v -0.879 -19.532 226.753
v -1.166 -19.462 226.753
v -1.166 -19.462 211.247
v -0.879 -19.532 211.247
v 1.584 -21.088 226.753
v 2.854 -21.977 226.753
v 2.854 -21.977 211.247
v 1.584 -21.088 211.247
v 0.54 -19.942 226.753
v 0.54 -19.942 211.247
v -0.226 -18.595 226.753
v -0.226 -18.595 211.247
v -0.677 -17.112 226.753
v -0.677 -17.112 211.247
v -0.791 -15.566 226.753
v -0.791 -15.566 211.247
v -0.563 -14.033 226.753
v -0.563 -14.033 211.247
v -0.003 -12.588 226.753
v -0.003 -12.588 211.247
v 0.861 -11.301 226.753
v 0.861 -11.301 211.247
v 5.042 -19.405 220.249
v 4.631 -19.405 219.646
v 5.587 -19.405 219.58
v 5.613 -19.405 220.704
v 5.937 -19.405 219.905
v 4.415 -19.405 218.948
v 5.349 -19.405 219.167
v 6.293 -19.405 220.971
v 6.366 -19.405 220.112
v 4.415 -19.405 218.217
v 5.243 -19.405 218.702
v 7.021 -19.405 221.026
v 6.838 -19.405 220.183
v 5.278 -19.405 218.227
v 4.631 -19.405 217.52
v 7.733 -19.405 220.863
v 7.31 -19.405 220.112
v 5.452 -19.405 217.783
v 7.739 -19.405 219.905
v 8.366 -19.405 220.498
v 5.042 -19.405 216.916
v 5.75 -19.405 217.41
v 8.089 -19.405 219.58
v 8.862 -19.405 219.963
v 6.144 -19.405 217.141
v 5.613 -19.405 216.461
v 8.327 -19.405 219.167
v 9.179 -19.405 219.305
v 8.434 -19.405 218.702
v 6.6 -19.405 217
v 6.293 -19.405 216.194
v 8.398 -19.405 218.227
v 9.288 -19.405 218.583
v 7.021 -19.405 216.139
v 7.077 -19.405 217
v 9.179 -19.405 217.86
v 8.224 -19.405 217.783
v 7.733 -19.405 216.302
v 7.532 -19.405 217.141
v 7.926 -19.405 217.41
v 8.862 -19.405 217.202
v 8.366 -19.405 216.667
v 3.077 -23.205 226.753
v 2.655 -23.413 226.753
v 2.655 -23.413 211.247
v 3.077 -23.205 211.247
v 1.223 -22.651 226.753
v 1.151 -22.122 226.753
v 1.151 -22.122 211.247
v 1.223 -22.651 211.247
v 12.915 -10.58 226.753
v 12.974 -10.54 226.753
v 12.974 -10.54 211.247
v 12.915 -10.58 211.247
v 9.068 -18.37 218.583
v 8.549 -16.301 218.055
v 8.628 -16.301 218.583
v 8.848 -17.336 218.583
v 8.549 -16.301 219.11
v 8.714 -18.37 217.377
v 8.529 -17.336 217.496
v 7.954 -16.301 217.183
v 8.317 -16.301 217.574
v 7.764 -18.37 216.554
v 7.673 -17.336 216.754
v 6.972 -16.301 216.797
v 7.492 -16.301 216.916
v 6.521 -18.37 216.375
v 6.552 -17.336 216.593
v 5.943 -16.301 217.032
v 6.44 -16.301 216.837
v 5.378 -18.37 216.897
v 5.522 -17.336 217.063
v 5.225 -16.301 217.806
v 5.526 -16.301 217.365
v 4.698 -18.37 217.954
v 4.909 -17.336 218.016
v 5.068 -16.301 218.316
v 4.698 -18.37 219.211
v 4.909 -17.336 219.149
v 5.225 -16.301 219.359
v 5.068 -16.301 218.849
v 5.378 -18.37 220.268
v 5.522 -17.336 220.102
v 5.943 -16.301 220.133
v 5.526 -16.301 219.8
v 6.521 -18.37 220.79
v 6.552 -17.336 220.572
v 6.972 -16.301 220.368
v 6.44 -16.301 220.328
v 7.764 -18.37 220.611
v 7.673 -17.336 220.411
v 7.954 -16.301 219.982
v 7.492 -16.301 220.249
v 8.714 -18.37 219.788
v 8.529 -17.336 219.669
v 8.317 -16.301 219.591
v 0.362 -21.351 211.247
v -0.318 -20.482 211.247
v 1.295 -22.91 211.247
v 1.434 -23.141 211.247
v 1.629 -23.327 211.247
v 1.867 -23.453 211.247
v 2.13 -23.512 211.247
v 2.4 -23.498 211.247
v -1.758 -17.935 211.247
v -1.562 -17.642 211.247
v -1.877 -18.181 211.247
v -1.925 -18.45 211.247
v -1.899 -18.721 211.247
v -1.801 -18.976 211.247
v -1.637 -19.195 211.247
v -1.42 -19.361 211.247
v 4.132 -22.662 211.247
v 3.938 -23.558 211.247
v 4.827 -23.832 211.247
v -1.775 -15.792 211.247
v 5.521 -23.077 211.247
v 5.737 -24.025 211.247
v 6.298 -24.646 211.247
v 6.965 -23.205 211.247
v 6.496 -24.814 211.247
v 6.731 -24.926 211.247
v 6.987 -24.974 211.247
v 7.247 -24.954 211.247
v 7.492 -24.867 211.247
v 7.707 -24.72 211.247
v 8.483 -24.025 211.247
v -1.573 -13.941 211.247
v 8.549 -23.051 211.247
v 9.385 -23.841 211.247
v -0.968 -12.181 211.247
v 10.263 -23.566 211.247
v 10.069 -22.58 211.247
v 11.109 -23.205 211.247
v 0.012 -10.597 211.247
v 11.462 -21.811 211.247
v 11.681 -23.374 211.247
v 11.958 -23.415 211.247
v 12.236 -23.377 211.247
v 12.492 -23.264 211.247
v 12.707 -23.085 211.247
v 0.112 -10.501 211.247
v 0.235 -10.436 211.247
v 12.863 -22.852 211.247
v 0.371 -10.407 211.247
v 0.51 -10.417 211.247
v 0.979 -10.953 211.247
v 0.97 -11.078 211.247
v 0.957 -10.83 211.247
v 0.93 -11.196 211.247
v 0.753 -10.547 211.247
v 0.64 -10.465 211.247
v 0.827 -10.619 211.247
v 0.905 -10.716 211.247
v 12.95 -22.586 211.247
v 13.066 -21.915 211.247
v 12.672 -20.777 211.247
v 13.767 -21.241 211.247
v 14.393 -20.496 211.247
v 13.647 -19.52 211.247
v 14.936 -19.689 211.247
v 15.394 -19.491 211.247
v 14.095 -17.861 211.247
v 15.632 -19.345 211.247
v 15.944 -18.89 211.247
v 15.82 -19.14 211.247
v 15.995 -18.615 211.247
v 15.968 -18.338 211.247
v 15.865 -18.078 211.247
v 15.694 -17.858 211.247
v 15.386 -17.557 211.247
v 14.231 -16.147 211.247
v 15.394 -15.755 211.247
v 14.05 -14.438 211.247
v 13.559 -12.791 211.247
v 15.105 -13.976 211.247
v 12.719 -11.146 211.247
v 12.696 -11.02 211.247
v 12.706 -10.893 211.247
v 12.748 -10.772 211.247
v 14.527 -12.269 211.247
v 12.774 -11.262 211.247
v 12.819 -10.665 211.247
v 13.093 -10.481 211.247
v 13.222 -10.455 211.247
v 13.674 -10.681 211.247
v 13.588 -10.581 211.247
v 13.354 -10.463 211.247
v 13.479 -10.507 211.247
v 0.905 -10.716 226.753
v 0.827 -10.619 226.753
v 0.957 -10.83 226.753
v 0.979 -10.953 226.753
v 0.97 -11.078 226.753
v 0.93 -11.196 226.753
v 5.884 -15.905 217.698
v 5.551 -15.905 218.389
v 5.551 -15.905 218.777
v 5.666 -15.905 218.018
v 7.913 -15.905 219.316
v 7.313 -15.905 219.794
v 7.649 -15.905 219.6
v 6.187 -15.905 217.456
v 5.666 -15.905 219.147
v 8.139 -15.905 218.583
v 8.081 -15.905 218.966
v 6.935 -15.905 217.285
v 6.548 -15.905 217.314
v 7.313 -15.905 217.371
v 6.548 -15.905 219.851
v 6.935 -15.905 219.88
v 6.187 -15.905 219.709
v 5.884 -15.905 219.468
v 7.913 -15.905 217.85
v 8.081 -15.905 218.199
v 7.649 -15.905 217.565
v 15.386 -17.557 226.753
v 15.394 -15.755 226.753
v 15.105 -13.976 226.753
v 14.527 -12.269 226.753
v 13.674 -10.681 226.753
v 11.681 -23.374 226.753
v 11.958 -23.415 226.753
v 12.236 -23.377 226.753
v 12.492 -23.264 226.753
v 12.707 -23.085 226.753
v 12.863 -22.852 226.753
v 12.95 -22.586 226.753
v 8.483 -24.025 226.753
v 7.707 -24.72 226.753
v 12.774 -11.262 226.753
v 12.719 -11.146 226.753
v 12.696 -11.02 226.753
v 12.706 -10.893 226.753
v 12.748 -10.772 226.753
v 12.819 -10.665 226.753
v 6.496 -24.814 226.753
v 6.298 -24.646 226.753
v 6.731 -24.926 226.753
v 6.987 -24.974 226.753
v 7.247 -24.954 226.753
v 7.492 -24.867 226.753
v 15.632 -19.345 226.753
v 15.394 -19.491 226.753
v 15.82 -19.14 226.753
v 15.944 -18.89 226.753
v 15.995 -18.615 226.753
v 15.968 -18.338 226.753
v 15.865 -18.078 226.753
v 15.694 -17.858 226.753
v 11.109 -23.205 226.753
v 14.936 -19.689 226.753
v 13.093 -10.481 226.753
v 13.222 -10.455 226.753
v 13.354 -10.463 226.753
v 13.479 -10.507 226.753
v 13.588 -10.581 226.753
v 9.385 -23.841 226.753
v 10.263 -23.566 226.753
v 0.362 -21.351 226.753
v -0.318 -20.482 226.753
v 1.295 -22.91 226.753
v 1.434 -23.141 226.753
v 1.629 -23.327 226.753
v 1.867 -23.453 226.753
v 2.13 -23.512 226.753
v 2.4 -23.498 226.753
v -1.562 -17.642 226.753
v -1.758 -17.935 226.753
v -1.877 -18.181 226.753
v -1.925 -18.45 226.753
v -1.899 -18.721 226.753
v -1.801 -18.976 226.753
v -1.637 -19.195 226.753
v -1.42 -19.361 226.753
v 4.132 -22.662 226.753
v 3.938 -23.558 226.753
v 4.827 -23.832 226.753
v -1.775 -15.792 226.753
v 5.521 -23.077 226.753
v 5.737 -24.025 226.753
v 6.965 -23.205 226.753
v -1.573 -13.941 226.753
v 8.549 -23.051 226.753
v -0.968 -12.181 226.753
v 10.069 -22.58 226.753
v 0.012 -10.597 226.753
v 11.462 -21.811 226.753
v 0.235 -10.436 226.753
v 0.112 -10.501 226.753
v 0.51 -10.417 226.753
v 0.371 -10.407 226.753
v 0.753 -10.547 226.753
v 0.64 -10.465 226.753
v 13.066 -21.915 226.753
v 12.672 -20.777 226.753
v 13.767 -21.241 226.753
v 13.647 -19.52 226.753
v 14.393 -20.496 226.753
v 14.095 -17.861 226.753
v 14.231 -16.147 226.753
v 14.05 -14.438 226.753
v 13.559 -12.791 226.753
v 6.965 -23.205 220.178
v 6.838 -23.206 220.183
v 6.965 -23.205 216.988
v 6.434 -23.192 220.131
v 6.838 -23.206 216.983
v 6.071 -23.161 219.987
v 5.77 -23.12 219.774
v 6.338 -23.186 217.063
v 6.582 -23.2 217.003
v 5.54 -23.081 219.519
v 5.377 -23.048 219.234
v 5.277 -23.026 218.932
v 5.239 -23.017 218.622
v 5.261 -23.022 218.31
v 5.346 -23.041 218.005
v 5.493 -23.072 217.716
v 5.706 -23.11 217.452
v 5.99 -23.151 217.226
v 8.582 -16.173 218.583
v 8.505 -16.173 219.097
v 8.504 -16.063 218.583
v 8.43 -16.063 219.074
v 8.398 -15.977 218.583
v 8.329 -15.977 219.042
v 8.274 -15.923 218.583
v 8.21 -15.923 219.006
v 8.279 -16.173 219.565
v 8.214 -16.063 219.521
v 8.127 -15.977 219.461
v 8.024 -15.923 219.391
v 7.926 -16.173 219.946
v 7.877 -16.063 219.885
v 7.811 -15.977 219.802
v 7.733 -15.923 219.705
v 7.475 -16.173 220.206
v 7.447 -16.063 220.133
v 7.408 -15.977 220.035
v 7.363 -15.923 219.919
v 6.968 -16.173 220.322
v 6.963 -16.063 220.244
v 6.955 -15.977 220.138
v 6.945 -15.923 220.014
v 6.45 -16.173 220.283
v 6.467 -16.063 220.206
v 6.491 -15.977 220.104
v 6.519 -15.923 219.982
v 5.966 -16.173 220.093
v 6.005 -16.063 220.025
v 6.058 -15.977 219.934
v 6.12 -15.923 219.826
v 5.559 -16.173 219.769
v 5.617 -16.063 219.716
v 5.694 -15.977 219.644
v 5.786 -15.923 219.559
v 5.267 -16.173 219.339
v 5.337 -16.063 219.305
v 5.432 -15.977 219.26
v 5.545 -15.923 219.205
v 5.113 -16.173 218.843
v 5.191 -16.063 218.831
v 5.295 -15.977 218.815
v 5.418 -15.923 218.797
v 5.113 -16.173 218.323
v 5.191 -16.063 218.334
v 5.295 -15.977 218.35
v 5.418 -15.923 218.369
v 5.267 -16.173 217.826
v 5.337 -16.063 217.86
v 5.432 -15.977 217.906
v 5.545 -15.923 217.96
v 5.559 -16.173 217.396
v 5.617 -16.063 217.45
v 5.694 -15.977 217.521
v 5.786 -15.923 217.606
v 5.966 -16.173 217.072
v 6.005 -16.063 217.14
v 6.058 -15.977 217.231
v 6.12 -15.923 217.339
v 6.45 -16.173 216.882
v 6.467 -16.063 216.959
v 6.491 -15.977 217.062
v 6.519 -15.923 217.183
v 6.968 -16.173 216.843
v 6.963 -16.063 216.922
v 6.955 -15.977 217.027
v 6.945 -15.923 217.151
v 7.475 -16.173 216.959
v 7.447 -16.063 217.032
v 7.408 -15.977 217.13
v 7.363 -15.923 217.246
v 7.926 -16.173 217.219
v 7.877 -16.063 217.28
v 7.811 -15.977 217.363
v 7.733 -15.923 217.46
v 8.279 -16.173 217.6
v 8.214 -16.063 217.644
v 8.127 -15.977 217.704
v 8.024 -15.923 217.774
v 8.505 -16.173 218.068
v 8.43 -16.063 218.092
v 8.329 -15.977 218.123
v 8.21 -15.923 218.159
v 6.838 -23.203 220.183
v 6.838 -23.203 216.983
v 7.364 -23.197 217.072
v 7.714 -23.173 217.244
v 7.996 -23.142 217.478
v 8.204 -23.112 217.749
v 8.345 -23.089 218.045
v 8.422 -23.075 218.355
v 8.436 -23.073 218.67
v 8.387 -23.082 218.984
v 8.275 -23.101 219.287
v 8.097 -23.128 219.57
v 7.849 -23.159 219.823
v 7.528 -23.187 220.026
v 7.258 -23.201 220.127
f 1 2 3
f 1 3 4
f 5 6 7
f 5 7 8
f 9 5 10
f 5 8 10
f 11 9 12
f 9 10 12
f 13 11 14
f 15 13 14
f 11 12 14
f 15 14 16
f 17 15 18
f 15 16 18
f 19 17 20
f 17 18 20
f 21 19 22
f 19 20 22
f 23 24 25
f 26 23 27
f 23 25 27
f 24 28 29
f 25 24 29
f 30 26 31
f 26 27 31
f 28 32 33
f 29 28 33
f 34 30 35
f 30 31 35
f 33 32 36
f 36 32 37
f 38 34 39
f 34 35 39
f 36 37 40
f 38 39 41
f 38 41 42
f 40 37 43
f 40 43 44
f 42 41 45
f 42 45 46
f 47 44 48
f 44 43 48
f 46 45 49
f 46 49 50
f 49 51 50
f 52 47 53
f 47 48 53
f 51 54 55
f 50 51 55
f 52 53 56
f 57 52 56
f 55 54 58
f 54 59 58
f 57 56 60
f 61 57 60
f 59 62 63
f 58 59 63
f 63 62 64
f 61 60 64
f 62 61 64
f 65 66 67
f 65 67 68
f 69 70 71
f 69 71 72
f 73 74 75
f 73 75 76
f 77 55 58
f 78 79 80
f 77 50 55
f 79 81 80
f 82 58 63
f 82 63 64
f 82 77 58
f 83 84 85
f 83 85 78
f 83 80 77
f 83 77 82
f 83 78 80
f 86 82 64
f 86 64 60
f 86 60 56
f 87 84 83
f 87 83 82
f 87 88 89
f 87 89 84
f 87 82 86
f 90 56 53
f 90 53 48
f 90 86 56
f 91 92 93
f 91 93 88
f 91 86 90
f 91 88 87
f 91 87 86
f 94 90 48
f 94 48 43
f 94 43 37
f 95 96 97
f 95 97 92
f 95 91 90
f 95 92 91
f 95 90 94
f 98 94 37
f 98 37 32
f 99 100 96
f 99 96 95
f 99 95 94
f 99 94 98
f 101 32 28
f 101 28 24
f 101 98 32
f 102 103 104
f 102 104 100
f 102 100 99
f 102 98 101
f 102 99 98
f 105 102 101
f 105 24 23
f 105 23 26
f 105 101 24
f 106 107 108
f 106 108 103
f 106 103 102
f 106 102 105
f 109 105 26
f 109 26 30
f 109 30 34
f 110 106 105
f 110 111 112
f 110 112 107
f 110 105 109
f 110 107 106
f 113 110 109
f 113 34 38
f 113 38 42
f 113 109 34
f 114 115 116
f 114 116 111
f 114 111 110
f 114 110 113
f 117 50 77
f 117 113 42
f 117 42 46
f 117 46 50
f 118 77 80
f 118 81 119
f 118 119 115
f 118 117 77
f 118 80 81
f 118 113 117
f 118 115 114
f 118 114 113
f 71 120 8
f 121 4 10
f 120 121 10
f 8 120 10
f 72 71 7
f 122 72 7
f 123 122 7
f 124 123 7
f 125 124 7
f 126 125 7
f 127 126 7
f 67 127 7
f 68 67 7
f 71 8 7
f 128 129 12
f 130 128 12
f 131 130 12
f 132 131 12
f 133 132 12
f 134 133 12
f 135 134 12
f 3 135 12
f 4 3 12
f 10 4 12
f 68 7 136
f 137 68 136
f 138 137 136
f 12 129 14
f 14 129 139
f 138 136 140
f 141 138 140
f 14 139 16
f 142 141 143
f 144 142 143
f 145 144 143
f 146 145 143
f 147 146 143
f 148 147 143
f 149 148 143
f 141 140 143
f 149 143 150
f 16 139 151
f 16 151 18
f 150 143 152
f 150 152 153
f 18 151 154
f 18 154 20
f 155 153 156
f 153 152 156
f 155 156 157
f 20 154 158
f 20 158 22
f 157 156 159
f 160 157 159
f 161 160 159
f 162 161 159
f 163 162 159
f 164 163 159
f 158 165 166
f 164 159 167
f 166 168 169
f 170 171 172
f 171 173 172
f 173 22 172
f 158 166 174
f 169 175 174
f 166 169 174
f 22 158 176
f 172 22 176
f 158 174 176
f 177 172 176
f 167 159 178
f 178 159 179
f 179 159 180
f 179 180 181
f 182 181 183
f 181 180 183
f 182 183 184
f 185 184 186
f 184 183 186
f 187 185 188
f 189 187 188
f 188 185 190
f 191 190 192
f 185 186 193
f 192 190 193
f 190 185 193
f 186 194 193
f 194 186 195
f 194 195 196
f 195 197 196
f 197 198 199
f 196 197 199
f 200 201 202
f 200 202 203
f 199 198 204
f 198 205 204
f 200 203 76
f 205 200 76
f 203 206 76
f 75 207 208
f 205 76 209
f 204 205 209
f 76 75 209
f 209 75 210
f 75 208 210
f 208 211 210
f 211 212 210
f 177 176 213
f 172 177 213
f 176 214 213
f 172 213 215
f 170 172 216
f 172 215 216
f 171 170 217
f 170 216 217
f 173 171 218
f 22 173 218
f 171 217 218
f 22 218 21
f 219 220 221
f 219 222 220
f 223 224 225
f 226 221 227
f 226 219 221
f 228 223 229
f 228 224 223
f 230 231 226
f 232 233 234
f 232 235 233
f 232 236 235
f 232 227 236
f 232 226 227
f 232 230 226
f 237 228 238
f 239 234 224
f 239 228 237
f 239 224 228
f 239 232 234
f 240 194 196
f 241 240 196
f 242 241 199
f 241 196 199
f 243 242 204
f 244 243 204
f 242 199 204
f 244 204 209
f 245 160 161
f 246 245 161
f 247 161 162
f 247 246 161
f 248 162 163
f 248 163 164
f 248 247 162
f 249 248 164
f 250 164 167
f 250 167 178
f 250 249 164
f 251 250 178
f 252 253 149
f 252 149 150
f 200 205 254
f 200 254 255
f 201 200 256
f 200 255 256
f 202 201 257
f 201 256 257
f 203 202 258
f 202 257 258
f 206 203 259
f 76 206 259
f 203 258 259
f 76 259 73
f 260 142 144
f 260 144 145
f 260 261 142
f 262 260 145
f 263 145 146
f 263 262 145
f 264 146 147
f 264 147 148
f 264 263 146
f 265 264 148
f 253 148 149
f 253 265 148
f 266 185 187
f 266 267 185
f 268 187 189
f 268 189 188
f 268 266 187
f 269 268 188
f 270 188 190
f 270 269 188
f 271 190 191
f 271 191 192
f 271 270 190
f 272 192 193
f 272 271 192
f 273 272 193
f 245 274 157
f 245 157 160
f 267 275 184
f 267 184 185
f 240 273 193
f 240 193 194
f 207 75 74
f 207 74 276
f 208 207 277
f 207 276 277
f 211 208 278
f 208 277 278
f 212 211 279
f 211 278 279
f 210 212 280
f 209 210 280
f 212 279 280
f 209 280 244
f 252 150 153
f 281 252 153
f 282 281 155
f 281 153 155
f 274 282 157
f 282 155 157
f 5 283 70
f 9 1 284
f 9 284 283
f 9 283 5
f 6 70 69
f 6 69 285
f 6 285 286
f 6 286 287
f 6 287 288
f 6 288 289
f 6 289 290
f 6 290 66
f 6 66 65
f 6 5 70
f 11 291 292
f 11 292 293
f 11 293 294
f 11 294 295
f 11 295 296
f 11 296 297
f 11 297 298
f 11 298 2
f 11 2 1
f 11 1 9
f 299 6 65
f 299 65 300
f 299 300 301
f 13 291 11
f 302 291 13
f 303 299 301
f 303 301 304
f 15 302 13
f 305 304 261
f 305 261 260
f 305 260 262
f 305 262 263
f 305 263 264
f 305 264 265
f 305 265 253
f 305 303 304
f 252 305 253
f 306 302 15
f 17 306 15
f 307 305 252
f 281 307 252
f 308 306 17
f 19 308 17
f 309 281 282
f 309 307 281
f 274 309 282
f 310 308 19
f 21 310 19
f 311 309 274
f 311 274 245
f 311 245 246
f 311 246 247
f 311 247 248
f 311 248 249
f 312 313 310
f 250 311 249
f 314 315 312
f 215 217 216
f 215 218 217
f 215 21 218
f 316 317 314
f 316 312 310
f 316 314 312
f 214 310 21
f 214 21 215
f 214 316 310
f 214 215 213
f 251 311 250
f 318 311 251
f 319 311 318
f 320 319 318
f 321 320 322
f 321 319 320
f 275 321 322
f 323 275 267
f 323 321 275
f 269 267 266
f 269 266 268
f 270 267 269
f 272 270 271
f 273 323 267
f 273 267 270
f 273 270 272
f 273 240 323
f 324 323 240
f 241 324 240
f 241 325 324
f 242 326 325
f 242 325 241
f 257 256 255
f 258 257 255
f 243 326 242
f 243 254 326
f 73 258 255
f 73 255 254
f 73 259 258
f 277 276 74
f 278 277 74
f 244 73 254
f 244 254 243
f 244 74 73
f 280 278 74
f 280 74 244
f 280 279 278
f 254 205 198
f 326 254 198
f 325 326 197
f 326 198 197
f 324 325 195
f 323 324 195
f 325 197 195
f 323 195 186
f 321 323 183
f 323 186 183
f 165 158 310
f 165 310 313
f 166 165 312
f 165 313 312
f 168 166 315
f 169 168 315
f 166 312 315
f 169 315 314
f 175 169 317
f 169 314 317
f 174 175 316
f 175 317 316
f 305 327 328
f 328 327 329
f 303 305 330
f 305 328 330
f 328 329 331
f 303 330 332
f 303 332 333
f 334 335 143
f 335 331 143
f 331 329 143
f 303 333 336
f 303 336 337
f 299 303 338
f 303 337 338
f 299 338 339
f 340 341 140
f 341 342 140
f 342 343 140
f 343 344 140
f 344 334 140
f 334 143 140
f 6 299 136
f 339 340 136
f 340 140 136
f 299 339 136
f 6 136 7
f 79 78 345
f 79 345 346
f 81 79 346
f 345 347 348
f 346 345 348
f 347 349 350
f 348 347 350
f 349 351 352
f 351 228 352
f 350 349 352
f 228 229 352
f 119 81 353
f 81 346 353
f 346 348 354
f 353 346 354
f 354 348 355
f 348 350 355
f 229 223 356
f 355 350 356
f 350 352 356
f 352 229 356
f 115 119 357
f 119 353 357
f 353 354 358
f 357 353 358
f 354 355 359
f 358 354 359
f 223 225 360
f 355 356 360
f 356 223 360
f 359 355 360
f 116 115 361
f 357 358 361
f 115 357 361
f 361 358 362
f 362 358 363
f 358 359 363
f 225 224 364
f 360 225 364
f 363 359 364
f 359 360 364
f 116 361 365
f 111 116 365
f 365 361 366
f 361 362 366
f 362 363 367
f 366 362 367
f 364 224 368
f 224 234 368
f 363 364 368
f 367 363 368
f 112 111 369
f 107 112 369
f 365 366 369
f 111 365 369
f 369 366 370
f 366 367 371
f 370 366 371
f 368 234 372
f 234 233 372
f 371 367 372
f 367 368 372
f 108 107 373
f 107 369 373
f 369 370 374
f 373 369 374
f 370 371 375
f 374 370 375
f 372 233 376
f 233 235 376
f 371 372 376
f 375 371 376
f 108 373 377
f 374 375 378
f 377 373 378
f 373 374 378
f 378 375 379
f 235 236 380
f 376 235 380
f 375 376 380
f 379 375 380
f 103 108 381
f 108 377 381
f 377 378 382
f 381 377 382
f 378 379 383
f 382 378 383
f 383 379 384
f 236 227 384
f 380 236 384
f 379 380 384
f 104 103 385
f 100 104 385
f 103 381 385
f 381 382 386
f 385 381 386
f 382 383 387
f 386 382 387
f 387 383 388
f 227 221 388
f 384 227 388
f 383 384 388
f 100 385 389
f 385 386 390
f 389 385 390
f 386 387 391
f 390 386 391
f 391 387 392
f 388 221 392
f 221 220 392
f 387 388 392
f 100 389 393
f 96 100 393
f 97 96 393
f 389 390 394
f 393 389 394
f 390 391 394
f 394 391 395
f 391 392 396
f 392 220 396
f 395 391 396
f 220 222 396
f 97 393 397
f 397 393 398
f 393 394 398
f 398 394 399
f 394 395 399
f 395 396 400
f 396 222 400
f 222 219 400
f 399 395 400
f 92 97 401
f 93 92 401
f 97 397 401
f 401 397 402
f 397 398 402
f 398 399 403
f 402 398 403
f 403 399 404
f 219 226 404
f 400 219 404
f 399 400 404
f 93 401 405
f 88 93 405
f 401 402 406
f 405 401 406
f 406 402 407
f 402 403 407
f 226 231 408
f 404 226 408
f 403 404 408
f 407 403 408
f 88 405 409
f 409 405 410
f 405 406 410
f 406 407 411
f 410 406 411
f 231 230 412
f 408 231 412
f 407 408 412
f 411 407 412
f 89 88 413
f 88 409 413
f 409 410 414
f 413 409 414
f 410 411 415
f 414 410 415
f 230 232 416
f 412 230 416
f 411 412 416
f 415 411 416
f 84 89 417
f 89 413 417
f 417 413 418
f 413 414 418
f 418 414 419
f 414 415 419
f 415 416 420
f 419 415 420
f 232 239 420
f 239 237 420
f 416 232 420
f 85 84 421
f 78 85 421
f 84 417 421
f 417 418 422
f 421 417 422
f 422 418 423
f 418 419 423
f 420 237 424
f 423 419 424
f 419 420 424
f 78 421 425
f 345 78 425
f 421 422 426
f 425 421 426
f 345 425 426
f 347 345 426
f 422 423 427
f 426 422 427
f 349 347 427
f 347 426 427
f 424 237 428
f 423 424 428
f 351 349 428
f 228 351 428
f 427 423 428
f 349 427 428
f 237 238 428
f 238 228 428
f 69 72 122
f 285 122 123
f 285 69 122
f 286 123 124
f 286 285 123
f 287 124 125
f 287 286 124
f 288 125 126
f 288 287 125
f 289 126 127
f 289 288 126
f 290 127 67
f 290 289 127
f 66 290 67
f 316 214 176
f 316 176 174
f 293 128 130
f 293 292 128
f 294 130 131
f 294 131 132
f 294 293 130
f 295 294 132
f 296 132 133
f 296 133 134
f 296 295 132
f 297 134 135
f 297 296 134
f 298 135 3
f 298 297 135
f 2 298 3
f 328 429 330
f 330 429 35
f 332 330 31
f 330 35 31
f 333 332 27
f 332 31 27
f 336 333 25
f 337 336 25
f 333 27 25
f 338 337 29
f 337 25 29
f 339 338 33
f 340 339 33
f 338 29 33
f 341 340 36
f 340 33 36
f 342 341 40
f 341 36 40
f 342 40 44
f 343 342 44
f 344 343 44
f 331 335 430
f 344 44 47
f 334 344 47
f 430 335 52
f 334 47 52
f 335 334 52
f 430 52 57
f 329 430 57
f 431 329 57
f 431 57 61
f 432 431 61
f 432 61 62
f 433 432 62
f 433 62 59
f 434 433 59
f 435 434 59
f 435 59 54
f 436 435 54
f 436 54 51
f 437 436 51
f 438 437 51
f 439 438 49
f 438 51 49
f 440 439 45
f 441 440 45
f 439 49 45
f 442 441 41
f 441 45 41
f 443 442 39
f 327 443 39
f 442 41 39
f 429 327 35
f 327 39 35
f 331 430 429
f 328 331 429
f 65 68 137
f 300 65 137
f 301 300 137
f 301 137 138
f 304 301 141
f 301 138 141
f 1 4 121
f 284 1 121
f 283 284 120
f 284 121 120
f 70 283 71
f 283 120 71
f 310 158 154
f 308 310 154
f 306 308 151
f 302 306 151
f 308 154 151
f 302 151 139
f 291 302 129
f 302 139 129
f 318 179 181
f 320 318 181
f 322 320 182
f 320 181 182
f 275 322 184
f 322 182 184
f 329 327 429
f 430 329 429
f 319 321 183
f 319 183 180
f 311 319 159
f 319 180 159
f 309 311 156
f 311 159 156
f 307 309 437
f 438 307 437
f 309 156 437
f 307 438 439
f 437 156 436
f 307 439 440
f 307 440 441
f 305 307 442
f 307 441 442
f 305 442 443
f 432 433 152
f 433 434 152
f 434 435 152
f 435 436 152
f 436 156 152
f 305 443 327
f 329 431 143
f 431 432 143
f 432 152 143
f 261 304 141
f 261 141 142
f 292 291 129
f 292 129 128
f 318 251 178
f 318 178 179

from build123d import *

# Parameters (mm, degrees)
BOSS_EXTRUDE2_DEPTH      = 438
SCALE2_SCALE             = 0.0354
FILLET1_R                = 1
FILLET3_R                = 0.5
BOSS_EXTRUDE4_REACH      = 229.494
BOSS_EXTRUDE4_END_RADIUS = 7.833804904
BOSS_EXTRUDE5_REACH      = 229.494
BOSS_EXTRUDE5_END_RADIUS = 7.195916772
SKETCH9_R                = 2.45
BOSS_EXTRUDE6_DEPTH      = 3.5
BOSS_EXTRUDE6_TAPER      = 12
FILLET4_R                = 0.5


with BuildPart() as part:
    # Sketch1 → Boss-Extrude2 (new body)
    with BuildSketch(Plane.XY):
        with BuildLine():
            Line((-163.578194132, 204.291420663), (-186.376739015, 226.341062883))
            ThreePointArc((-186.376739015, 226.341062883), (-239.375206738, 127.519864833), (-240.870528276, 15.393905402))
            Line((-240.870528276, 15.393905402), (-268.785604462, -26.370002184))
            Line((-268.785604462, -26.370002184), (-221.583341967, -38.017313709))
            ThreePointArc((-221.583341967, -38.017313709), (-196.547148618, -77.434601057), (-164.251041881, -111.161370973))
            Line((-164.251041881, -111.161370973), (-156.910200465, -164.920829998))
            Line((-156.910200465, -164.920829998), (-109.836943046, -141.764303292))
            ThreePointArc((-109.836943046, -141.764303292), (-73.054639313, -155.90344513), (-34.693982777, -164.920829998))
            Line((-34.693982777, -164.920829998), (0, -203.328769621))
            Line((0, -203.328769621), (42.8865283, -164.920829998))
            ThreePointArc((42.8865283, -164.920829998), (80.850316946, -156.155814803), (117.057486625, -141.764303292))
            Line((117.057486625, -141.764303292), (163.626630073, -155.521102036))
            Line((163.626630073, -155.521102036), (172.334894528, -105.315261233))
            ThreePointArc((172.334894528, -105.315261233), (201.269995869, -76.001800701), (225.162074479, -42.450531906))
            Line((225.162074479, -42.450531906), (276.709162079, -20.095520822))
            Line((276.709162079, -20.095520822), (237.860130884, 17.793666683))
            ThreePointArc((237.860130884, 17.793666683), (228.121311005, 125.922470041), (181.39622554, 223.91965937))
            Line((181.39622554, 223.91965937), (156.421805868, 206.970503899))
            ThreePointArc((156.421805868, 206.970503899), (202.986661671, 88.666279899), (188.748912803, -37.672398736))
            ThreePointArc((188.748912803, -37.672398736), (107.904666904, -114.25255983), (0, -141.764303292))
            ThreePointArc((0, -141.764303292), (-60.71851518, -133.27976481), (-116.145688788, -107.077591147))
            ThreePointArc((-116.145688788, -107.077591147), (-216.983443781, 36.858584217), (-163.578194132, 204.291420663))
        make_face()
    extrude(amount=BOSS_EXTRUDE2_DEPTH)


with BuildPart() as part_1:
    # Scale2: scaled about (7.22089485, -18.85403102, 219)
    add(part.part.scale(SCALE2_SCALE).moved(Location((6.965275172, -18.186598322, 211.2474))))

    # Fillet1
    fillet1_edges = [part_1.edges().sort_by_distance(p)[0] for p in [
        (16.76077951, -18.897979759, 219),
        (12.757657877, -23.692045334, 219),
        (6.965275172, -25.384436766, 219),
        (1.410654076, -24.024795704, 219),
        (-2.549735226, -19.120096399, 219),
    ]]
    fillet(fillet1_edges, radius=FILLET1_R)

    # Fillet3
    fillet3_edges = [part_1.edges().sort_by_distance(p)[0] for p in [
        (12.5026071, -10.859842484, 219),
        (13.386701556, -10.25984238, 219),
        (0.367538611, -10.174124696, 219),
        (1.1746071, -10.95468203, 219),
    ]]
    fillet(fillet3_edges, radius=FILLET3_R)

    # Boss-Extrude4: up to this cylinder (the profile starts inside it)
    boss_extrude4_end = Plane(origin=(7.002032477, -15.371335991, 218.5826), z_dir=(0, 0, -1)) * Cylinder(BOSS_EXTRUDE4_END_RADIUS, 475.655609807, mode=Mode.PRIVATE)
    # Sketch5 → Boss-Extrude4 (add, up to the surface)
    with BuildSketch(Plane(origin=(0, -19.405054659, 0), x_dir=(-1, 0, 0), z_dir=(0, -1, 0)), mode=Mode.PRIVATE) as boss_extrude4_sk1:
        with BuildLine():
            Line((-6.838033993, -220.1826), (-6.838033993, -216.9826))
            ThreePointArc((-6.838033993, -216.9826), (-8.438033993, -218.5826), (-6.838033993, -220.1826))
        make_face()
    boss_extrude4_tool1 = extrude(boss_extrude4_sk1.sketch, amount=BOSS_EXTRUDE4_REACH, mode=Mode.PRIVATE) & boss_extrude4_end
    add(boss_extrude4_tool1.solids().sort_by_distance((7.517095, -19.405055, 218.5826))[0])

    # Boss-Extrude5: up to this cylinder (the profile starts inside it)
    boss_extrude5_end = Plane(origin=(6.875019163, -16.009703934, 218.5826), z_dir=(0, 0, -1)) * Cylinder(BOSS_EXTRUDE5_END_RADIUS, 474.379833545, mode=Mode.PRIVATE)
    # Sketch8 → Boss-Extrude5 (add, up to the surface)
    with BuildSketch(Plane(origin=(0, -19.405054659, 0), x_dir=(-1, 0, 0), z_dir=(0, -1, 0)), mode=Mode.PRIVATE) as boss_extrude5_sk1:
        with BuildLine():
            Line((-6.838033993, -216.9826), (-6.838033993, -220.1826))
            ThreePointArc((-6.838033993, -220.1826), (-5.238033993, -218.5826), (-6.838033993, -216.9826))
        make_face()
    boss_extrude5_tool1 = extrude(boss_extrude5_sk1.sketch, amount=BOSS_EXTRUDE5_REACH, mode=Mode.PRIVATE) & boss_extrude5_end
    add(boss_extrude5_tool1.solids().sort_by_distance((6.158973, -19.405055, 218.5826))[0])

    # Sketch9 → Boss-Extrude6 (add)
    with BuildSketch(Plane(origin=(0, -19.405054659, 0), x_dir=(1, 0, 0), z_dir=(0, 1, 0))):
        with Locations((6.838033993, -218.5826)):
            Circle(SKETCH9_R)
    extrude(amount=BOSS_EXTRUDE6_DEPTH, taper=BOSS_EXTRUDE6_TAPER)

    # Fillet4
    fillet4_edges = [part_1.edges().sort_by_distance(p)[0] for p in [
        (5.131981959, -15.905054659, 218.5826),
    ]]
    fillet(fillet4_edges, radius=FILLET4_R)


solid = part_1.part
